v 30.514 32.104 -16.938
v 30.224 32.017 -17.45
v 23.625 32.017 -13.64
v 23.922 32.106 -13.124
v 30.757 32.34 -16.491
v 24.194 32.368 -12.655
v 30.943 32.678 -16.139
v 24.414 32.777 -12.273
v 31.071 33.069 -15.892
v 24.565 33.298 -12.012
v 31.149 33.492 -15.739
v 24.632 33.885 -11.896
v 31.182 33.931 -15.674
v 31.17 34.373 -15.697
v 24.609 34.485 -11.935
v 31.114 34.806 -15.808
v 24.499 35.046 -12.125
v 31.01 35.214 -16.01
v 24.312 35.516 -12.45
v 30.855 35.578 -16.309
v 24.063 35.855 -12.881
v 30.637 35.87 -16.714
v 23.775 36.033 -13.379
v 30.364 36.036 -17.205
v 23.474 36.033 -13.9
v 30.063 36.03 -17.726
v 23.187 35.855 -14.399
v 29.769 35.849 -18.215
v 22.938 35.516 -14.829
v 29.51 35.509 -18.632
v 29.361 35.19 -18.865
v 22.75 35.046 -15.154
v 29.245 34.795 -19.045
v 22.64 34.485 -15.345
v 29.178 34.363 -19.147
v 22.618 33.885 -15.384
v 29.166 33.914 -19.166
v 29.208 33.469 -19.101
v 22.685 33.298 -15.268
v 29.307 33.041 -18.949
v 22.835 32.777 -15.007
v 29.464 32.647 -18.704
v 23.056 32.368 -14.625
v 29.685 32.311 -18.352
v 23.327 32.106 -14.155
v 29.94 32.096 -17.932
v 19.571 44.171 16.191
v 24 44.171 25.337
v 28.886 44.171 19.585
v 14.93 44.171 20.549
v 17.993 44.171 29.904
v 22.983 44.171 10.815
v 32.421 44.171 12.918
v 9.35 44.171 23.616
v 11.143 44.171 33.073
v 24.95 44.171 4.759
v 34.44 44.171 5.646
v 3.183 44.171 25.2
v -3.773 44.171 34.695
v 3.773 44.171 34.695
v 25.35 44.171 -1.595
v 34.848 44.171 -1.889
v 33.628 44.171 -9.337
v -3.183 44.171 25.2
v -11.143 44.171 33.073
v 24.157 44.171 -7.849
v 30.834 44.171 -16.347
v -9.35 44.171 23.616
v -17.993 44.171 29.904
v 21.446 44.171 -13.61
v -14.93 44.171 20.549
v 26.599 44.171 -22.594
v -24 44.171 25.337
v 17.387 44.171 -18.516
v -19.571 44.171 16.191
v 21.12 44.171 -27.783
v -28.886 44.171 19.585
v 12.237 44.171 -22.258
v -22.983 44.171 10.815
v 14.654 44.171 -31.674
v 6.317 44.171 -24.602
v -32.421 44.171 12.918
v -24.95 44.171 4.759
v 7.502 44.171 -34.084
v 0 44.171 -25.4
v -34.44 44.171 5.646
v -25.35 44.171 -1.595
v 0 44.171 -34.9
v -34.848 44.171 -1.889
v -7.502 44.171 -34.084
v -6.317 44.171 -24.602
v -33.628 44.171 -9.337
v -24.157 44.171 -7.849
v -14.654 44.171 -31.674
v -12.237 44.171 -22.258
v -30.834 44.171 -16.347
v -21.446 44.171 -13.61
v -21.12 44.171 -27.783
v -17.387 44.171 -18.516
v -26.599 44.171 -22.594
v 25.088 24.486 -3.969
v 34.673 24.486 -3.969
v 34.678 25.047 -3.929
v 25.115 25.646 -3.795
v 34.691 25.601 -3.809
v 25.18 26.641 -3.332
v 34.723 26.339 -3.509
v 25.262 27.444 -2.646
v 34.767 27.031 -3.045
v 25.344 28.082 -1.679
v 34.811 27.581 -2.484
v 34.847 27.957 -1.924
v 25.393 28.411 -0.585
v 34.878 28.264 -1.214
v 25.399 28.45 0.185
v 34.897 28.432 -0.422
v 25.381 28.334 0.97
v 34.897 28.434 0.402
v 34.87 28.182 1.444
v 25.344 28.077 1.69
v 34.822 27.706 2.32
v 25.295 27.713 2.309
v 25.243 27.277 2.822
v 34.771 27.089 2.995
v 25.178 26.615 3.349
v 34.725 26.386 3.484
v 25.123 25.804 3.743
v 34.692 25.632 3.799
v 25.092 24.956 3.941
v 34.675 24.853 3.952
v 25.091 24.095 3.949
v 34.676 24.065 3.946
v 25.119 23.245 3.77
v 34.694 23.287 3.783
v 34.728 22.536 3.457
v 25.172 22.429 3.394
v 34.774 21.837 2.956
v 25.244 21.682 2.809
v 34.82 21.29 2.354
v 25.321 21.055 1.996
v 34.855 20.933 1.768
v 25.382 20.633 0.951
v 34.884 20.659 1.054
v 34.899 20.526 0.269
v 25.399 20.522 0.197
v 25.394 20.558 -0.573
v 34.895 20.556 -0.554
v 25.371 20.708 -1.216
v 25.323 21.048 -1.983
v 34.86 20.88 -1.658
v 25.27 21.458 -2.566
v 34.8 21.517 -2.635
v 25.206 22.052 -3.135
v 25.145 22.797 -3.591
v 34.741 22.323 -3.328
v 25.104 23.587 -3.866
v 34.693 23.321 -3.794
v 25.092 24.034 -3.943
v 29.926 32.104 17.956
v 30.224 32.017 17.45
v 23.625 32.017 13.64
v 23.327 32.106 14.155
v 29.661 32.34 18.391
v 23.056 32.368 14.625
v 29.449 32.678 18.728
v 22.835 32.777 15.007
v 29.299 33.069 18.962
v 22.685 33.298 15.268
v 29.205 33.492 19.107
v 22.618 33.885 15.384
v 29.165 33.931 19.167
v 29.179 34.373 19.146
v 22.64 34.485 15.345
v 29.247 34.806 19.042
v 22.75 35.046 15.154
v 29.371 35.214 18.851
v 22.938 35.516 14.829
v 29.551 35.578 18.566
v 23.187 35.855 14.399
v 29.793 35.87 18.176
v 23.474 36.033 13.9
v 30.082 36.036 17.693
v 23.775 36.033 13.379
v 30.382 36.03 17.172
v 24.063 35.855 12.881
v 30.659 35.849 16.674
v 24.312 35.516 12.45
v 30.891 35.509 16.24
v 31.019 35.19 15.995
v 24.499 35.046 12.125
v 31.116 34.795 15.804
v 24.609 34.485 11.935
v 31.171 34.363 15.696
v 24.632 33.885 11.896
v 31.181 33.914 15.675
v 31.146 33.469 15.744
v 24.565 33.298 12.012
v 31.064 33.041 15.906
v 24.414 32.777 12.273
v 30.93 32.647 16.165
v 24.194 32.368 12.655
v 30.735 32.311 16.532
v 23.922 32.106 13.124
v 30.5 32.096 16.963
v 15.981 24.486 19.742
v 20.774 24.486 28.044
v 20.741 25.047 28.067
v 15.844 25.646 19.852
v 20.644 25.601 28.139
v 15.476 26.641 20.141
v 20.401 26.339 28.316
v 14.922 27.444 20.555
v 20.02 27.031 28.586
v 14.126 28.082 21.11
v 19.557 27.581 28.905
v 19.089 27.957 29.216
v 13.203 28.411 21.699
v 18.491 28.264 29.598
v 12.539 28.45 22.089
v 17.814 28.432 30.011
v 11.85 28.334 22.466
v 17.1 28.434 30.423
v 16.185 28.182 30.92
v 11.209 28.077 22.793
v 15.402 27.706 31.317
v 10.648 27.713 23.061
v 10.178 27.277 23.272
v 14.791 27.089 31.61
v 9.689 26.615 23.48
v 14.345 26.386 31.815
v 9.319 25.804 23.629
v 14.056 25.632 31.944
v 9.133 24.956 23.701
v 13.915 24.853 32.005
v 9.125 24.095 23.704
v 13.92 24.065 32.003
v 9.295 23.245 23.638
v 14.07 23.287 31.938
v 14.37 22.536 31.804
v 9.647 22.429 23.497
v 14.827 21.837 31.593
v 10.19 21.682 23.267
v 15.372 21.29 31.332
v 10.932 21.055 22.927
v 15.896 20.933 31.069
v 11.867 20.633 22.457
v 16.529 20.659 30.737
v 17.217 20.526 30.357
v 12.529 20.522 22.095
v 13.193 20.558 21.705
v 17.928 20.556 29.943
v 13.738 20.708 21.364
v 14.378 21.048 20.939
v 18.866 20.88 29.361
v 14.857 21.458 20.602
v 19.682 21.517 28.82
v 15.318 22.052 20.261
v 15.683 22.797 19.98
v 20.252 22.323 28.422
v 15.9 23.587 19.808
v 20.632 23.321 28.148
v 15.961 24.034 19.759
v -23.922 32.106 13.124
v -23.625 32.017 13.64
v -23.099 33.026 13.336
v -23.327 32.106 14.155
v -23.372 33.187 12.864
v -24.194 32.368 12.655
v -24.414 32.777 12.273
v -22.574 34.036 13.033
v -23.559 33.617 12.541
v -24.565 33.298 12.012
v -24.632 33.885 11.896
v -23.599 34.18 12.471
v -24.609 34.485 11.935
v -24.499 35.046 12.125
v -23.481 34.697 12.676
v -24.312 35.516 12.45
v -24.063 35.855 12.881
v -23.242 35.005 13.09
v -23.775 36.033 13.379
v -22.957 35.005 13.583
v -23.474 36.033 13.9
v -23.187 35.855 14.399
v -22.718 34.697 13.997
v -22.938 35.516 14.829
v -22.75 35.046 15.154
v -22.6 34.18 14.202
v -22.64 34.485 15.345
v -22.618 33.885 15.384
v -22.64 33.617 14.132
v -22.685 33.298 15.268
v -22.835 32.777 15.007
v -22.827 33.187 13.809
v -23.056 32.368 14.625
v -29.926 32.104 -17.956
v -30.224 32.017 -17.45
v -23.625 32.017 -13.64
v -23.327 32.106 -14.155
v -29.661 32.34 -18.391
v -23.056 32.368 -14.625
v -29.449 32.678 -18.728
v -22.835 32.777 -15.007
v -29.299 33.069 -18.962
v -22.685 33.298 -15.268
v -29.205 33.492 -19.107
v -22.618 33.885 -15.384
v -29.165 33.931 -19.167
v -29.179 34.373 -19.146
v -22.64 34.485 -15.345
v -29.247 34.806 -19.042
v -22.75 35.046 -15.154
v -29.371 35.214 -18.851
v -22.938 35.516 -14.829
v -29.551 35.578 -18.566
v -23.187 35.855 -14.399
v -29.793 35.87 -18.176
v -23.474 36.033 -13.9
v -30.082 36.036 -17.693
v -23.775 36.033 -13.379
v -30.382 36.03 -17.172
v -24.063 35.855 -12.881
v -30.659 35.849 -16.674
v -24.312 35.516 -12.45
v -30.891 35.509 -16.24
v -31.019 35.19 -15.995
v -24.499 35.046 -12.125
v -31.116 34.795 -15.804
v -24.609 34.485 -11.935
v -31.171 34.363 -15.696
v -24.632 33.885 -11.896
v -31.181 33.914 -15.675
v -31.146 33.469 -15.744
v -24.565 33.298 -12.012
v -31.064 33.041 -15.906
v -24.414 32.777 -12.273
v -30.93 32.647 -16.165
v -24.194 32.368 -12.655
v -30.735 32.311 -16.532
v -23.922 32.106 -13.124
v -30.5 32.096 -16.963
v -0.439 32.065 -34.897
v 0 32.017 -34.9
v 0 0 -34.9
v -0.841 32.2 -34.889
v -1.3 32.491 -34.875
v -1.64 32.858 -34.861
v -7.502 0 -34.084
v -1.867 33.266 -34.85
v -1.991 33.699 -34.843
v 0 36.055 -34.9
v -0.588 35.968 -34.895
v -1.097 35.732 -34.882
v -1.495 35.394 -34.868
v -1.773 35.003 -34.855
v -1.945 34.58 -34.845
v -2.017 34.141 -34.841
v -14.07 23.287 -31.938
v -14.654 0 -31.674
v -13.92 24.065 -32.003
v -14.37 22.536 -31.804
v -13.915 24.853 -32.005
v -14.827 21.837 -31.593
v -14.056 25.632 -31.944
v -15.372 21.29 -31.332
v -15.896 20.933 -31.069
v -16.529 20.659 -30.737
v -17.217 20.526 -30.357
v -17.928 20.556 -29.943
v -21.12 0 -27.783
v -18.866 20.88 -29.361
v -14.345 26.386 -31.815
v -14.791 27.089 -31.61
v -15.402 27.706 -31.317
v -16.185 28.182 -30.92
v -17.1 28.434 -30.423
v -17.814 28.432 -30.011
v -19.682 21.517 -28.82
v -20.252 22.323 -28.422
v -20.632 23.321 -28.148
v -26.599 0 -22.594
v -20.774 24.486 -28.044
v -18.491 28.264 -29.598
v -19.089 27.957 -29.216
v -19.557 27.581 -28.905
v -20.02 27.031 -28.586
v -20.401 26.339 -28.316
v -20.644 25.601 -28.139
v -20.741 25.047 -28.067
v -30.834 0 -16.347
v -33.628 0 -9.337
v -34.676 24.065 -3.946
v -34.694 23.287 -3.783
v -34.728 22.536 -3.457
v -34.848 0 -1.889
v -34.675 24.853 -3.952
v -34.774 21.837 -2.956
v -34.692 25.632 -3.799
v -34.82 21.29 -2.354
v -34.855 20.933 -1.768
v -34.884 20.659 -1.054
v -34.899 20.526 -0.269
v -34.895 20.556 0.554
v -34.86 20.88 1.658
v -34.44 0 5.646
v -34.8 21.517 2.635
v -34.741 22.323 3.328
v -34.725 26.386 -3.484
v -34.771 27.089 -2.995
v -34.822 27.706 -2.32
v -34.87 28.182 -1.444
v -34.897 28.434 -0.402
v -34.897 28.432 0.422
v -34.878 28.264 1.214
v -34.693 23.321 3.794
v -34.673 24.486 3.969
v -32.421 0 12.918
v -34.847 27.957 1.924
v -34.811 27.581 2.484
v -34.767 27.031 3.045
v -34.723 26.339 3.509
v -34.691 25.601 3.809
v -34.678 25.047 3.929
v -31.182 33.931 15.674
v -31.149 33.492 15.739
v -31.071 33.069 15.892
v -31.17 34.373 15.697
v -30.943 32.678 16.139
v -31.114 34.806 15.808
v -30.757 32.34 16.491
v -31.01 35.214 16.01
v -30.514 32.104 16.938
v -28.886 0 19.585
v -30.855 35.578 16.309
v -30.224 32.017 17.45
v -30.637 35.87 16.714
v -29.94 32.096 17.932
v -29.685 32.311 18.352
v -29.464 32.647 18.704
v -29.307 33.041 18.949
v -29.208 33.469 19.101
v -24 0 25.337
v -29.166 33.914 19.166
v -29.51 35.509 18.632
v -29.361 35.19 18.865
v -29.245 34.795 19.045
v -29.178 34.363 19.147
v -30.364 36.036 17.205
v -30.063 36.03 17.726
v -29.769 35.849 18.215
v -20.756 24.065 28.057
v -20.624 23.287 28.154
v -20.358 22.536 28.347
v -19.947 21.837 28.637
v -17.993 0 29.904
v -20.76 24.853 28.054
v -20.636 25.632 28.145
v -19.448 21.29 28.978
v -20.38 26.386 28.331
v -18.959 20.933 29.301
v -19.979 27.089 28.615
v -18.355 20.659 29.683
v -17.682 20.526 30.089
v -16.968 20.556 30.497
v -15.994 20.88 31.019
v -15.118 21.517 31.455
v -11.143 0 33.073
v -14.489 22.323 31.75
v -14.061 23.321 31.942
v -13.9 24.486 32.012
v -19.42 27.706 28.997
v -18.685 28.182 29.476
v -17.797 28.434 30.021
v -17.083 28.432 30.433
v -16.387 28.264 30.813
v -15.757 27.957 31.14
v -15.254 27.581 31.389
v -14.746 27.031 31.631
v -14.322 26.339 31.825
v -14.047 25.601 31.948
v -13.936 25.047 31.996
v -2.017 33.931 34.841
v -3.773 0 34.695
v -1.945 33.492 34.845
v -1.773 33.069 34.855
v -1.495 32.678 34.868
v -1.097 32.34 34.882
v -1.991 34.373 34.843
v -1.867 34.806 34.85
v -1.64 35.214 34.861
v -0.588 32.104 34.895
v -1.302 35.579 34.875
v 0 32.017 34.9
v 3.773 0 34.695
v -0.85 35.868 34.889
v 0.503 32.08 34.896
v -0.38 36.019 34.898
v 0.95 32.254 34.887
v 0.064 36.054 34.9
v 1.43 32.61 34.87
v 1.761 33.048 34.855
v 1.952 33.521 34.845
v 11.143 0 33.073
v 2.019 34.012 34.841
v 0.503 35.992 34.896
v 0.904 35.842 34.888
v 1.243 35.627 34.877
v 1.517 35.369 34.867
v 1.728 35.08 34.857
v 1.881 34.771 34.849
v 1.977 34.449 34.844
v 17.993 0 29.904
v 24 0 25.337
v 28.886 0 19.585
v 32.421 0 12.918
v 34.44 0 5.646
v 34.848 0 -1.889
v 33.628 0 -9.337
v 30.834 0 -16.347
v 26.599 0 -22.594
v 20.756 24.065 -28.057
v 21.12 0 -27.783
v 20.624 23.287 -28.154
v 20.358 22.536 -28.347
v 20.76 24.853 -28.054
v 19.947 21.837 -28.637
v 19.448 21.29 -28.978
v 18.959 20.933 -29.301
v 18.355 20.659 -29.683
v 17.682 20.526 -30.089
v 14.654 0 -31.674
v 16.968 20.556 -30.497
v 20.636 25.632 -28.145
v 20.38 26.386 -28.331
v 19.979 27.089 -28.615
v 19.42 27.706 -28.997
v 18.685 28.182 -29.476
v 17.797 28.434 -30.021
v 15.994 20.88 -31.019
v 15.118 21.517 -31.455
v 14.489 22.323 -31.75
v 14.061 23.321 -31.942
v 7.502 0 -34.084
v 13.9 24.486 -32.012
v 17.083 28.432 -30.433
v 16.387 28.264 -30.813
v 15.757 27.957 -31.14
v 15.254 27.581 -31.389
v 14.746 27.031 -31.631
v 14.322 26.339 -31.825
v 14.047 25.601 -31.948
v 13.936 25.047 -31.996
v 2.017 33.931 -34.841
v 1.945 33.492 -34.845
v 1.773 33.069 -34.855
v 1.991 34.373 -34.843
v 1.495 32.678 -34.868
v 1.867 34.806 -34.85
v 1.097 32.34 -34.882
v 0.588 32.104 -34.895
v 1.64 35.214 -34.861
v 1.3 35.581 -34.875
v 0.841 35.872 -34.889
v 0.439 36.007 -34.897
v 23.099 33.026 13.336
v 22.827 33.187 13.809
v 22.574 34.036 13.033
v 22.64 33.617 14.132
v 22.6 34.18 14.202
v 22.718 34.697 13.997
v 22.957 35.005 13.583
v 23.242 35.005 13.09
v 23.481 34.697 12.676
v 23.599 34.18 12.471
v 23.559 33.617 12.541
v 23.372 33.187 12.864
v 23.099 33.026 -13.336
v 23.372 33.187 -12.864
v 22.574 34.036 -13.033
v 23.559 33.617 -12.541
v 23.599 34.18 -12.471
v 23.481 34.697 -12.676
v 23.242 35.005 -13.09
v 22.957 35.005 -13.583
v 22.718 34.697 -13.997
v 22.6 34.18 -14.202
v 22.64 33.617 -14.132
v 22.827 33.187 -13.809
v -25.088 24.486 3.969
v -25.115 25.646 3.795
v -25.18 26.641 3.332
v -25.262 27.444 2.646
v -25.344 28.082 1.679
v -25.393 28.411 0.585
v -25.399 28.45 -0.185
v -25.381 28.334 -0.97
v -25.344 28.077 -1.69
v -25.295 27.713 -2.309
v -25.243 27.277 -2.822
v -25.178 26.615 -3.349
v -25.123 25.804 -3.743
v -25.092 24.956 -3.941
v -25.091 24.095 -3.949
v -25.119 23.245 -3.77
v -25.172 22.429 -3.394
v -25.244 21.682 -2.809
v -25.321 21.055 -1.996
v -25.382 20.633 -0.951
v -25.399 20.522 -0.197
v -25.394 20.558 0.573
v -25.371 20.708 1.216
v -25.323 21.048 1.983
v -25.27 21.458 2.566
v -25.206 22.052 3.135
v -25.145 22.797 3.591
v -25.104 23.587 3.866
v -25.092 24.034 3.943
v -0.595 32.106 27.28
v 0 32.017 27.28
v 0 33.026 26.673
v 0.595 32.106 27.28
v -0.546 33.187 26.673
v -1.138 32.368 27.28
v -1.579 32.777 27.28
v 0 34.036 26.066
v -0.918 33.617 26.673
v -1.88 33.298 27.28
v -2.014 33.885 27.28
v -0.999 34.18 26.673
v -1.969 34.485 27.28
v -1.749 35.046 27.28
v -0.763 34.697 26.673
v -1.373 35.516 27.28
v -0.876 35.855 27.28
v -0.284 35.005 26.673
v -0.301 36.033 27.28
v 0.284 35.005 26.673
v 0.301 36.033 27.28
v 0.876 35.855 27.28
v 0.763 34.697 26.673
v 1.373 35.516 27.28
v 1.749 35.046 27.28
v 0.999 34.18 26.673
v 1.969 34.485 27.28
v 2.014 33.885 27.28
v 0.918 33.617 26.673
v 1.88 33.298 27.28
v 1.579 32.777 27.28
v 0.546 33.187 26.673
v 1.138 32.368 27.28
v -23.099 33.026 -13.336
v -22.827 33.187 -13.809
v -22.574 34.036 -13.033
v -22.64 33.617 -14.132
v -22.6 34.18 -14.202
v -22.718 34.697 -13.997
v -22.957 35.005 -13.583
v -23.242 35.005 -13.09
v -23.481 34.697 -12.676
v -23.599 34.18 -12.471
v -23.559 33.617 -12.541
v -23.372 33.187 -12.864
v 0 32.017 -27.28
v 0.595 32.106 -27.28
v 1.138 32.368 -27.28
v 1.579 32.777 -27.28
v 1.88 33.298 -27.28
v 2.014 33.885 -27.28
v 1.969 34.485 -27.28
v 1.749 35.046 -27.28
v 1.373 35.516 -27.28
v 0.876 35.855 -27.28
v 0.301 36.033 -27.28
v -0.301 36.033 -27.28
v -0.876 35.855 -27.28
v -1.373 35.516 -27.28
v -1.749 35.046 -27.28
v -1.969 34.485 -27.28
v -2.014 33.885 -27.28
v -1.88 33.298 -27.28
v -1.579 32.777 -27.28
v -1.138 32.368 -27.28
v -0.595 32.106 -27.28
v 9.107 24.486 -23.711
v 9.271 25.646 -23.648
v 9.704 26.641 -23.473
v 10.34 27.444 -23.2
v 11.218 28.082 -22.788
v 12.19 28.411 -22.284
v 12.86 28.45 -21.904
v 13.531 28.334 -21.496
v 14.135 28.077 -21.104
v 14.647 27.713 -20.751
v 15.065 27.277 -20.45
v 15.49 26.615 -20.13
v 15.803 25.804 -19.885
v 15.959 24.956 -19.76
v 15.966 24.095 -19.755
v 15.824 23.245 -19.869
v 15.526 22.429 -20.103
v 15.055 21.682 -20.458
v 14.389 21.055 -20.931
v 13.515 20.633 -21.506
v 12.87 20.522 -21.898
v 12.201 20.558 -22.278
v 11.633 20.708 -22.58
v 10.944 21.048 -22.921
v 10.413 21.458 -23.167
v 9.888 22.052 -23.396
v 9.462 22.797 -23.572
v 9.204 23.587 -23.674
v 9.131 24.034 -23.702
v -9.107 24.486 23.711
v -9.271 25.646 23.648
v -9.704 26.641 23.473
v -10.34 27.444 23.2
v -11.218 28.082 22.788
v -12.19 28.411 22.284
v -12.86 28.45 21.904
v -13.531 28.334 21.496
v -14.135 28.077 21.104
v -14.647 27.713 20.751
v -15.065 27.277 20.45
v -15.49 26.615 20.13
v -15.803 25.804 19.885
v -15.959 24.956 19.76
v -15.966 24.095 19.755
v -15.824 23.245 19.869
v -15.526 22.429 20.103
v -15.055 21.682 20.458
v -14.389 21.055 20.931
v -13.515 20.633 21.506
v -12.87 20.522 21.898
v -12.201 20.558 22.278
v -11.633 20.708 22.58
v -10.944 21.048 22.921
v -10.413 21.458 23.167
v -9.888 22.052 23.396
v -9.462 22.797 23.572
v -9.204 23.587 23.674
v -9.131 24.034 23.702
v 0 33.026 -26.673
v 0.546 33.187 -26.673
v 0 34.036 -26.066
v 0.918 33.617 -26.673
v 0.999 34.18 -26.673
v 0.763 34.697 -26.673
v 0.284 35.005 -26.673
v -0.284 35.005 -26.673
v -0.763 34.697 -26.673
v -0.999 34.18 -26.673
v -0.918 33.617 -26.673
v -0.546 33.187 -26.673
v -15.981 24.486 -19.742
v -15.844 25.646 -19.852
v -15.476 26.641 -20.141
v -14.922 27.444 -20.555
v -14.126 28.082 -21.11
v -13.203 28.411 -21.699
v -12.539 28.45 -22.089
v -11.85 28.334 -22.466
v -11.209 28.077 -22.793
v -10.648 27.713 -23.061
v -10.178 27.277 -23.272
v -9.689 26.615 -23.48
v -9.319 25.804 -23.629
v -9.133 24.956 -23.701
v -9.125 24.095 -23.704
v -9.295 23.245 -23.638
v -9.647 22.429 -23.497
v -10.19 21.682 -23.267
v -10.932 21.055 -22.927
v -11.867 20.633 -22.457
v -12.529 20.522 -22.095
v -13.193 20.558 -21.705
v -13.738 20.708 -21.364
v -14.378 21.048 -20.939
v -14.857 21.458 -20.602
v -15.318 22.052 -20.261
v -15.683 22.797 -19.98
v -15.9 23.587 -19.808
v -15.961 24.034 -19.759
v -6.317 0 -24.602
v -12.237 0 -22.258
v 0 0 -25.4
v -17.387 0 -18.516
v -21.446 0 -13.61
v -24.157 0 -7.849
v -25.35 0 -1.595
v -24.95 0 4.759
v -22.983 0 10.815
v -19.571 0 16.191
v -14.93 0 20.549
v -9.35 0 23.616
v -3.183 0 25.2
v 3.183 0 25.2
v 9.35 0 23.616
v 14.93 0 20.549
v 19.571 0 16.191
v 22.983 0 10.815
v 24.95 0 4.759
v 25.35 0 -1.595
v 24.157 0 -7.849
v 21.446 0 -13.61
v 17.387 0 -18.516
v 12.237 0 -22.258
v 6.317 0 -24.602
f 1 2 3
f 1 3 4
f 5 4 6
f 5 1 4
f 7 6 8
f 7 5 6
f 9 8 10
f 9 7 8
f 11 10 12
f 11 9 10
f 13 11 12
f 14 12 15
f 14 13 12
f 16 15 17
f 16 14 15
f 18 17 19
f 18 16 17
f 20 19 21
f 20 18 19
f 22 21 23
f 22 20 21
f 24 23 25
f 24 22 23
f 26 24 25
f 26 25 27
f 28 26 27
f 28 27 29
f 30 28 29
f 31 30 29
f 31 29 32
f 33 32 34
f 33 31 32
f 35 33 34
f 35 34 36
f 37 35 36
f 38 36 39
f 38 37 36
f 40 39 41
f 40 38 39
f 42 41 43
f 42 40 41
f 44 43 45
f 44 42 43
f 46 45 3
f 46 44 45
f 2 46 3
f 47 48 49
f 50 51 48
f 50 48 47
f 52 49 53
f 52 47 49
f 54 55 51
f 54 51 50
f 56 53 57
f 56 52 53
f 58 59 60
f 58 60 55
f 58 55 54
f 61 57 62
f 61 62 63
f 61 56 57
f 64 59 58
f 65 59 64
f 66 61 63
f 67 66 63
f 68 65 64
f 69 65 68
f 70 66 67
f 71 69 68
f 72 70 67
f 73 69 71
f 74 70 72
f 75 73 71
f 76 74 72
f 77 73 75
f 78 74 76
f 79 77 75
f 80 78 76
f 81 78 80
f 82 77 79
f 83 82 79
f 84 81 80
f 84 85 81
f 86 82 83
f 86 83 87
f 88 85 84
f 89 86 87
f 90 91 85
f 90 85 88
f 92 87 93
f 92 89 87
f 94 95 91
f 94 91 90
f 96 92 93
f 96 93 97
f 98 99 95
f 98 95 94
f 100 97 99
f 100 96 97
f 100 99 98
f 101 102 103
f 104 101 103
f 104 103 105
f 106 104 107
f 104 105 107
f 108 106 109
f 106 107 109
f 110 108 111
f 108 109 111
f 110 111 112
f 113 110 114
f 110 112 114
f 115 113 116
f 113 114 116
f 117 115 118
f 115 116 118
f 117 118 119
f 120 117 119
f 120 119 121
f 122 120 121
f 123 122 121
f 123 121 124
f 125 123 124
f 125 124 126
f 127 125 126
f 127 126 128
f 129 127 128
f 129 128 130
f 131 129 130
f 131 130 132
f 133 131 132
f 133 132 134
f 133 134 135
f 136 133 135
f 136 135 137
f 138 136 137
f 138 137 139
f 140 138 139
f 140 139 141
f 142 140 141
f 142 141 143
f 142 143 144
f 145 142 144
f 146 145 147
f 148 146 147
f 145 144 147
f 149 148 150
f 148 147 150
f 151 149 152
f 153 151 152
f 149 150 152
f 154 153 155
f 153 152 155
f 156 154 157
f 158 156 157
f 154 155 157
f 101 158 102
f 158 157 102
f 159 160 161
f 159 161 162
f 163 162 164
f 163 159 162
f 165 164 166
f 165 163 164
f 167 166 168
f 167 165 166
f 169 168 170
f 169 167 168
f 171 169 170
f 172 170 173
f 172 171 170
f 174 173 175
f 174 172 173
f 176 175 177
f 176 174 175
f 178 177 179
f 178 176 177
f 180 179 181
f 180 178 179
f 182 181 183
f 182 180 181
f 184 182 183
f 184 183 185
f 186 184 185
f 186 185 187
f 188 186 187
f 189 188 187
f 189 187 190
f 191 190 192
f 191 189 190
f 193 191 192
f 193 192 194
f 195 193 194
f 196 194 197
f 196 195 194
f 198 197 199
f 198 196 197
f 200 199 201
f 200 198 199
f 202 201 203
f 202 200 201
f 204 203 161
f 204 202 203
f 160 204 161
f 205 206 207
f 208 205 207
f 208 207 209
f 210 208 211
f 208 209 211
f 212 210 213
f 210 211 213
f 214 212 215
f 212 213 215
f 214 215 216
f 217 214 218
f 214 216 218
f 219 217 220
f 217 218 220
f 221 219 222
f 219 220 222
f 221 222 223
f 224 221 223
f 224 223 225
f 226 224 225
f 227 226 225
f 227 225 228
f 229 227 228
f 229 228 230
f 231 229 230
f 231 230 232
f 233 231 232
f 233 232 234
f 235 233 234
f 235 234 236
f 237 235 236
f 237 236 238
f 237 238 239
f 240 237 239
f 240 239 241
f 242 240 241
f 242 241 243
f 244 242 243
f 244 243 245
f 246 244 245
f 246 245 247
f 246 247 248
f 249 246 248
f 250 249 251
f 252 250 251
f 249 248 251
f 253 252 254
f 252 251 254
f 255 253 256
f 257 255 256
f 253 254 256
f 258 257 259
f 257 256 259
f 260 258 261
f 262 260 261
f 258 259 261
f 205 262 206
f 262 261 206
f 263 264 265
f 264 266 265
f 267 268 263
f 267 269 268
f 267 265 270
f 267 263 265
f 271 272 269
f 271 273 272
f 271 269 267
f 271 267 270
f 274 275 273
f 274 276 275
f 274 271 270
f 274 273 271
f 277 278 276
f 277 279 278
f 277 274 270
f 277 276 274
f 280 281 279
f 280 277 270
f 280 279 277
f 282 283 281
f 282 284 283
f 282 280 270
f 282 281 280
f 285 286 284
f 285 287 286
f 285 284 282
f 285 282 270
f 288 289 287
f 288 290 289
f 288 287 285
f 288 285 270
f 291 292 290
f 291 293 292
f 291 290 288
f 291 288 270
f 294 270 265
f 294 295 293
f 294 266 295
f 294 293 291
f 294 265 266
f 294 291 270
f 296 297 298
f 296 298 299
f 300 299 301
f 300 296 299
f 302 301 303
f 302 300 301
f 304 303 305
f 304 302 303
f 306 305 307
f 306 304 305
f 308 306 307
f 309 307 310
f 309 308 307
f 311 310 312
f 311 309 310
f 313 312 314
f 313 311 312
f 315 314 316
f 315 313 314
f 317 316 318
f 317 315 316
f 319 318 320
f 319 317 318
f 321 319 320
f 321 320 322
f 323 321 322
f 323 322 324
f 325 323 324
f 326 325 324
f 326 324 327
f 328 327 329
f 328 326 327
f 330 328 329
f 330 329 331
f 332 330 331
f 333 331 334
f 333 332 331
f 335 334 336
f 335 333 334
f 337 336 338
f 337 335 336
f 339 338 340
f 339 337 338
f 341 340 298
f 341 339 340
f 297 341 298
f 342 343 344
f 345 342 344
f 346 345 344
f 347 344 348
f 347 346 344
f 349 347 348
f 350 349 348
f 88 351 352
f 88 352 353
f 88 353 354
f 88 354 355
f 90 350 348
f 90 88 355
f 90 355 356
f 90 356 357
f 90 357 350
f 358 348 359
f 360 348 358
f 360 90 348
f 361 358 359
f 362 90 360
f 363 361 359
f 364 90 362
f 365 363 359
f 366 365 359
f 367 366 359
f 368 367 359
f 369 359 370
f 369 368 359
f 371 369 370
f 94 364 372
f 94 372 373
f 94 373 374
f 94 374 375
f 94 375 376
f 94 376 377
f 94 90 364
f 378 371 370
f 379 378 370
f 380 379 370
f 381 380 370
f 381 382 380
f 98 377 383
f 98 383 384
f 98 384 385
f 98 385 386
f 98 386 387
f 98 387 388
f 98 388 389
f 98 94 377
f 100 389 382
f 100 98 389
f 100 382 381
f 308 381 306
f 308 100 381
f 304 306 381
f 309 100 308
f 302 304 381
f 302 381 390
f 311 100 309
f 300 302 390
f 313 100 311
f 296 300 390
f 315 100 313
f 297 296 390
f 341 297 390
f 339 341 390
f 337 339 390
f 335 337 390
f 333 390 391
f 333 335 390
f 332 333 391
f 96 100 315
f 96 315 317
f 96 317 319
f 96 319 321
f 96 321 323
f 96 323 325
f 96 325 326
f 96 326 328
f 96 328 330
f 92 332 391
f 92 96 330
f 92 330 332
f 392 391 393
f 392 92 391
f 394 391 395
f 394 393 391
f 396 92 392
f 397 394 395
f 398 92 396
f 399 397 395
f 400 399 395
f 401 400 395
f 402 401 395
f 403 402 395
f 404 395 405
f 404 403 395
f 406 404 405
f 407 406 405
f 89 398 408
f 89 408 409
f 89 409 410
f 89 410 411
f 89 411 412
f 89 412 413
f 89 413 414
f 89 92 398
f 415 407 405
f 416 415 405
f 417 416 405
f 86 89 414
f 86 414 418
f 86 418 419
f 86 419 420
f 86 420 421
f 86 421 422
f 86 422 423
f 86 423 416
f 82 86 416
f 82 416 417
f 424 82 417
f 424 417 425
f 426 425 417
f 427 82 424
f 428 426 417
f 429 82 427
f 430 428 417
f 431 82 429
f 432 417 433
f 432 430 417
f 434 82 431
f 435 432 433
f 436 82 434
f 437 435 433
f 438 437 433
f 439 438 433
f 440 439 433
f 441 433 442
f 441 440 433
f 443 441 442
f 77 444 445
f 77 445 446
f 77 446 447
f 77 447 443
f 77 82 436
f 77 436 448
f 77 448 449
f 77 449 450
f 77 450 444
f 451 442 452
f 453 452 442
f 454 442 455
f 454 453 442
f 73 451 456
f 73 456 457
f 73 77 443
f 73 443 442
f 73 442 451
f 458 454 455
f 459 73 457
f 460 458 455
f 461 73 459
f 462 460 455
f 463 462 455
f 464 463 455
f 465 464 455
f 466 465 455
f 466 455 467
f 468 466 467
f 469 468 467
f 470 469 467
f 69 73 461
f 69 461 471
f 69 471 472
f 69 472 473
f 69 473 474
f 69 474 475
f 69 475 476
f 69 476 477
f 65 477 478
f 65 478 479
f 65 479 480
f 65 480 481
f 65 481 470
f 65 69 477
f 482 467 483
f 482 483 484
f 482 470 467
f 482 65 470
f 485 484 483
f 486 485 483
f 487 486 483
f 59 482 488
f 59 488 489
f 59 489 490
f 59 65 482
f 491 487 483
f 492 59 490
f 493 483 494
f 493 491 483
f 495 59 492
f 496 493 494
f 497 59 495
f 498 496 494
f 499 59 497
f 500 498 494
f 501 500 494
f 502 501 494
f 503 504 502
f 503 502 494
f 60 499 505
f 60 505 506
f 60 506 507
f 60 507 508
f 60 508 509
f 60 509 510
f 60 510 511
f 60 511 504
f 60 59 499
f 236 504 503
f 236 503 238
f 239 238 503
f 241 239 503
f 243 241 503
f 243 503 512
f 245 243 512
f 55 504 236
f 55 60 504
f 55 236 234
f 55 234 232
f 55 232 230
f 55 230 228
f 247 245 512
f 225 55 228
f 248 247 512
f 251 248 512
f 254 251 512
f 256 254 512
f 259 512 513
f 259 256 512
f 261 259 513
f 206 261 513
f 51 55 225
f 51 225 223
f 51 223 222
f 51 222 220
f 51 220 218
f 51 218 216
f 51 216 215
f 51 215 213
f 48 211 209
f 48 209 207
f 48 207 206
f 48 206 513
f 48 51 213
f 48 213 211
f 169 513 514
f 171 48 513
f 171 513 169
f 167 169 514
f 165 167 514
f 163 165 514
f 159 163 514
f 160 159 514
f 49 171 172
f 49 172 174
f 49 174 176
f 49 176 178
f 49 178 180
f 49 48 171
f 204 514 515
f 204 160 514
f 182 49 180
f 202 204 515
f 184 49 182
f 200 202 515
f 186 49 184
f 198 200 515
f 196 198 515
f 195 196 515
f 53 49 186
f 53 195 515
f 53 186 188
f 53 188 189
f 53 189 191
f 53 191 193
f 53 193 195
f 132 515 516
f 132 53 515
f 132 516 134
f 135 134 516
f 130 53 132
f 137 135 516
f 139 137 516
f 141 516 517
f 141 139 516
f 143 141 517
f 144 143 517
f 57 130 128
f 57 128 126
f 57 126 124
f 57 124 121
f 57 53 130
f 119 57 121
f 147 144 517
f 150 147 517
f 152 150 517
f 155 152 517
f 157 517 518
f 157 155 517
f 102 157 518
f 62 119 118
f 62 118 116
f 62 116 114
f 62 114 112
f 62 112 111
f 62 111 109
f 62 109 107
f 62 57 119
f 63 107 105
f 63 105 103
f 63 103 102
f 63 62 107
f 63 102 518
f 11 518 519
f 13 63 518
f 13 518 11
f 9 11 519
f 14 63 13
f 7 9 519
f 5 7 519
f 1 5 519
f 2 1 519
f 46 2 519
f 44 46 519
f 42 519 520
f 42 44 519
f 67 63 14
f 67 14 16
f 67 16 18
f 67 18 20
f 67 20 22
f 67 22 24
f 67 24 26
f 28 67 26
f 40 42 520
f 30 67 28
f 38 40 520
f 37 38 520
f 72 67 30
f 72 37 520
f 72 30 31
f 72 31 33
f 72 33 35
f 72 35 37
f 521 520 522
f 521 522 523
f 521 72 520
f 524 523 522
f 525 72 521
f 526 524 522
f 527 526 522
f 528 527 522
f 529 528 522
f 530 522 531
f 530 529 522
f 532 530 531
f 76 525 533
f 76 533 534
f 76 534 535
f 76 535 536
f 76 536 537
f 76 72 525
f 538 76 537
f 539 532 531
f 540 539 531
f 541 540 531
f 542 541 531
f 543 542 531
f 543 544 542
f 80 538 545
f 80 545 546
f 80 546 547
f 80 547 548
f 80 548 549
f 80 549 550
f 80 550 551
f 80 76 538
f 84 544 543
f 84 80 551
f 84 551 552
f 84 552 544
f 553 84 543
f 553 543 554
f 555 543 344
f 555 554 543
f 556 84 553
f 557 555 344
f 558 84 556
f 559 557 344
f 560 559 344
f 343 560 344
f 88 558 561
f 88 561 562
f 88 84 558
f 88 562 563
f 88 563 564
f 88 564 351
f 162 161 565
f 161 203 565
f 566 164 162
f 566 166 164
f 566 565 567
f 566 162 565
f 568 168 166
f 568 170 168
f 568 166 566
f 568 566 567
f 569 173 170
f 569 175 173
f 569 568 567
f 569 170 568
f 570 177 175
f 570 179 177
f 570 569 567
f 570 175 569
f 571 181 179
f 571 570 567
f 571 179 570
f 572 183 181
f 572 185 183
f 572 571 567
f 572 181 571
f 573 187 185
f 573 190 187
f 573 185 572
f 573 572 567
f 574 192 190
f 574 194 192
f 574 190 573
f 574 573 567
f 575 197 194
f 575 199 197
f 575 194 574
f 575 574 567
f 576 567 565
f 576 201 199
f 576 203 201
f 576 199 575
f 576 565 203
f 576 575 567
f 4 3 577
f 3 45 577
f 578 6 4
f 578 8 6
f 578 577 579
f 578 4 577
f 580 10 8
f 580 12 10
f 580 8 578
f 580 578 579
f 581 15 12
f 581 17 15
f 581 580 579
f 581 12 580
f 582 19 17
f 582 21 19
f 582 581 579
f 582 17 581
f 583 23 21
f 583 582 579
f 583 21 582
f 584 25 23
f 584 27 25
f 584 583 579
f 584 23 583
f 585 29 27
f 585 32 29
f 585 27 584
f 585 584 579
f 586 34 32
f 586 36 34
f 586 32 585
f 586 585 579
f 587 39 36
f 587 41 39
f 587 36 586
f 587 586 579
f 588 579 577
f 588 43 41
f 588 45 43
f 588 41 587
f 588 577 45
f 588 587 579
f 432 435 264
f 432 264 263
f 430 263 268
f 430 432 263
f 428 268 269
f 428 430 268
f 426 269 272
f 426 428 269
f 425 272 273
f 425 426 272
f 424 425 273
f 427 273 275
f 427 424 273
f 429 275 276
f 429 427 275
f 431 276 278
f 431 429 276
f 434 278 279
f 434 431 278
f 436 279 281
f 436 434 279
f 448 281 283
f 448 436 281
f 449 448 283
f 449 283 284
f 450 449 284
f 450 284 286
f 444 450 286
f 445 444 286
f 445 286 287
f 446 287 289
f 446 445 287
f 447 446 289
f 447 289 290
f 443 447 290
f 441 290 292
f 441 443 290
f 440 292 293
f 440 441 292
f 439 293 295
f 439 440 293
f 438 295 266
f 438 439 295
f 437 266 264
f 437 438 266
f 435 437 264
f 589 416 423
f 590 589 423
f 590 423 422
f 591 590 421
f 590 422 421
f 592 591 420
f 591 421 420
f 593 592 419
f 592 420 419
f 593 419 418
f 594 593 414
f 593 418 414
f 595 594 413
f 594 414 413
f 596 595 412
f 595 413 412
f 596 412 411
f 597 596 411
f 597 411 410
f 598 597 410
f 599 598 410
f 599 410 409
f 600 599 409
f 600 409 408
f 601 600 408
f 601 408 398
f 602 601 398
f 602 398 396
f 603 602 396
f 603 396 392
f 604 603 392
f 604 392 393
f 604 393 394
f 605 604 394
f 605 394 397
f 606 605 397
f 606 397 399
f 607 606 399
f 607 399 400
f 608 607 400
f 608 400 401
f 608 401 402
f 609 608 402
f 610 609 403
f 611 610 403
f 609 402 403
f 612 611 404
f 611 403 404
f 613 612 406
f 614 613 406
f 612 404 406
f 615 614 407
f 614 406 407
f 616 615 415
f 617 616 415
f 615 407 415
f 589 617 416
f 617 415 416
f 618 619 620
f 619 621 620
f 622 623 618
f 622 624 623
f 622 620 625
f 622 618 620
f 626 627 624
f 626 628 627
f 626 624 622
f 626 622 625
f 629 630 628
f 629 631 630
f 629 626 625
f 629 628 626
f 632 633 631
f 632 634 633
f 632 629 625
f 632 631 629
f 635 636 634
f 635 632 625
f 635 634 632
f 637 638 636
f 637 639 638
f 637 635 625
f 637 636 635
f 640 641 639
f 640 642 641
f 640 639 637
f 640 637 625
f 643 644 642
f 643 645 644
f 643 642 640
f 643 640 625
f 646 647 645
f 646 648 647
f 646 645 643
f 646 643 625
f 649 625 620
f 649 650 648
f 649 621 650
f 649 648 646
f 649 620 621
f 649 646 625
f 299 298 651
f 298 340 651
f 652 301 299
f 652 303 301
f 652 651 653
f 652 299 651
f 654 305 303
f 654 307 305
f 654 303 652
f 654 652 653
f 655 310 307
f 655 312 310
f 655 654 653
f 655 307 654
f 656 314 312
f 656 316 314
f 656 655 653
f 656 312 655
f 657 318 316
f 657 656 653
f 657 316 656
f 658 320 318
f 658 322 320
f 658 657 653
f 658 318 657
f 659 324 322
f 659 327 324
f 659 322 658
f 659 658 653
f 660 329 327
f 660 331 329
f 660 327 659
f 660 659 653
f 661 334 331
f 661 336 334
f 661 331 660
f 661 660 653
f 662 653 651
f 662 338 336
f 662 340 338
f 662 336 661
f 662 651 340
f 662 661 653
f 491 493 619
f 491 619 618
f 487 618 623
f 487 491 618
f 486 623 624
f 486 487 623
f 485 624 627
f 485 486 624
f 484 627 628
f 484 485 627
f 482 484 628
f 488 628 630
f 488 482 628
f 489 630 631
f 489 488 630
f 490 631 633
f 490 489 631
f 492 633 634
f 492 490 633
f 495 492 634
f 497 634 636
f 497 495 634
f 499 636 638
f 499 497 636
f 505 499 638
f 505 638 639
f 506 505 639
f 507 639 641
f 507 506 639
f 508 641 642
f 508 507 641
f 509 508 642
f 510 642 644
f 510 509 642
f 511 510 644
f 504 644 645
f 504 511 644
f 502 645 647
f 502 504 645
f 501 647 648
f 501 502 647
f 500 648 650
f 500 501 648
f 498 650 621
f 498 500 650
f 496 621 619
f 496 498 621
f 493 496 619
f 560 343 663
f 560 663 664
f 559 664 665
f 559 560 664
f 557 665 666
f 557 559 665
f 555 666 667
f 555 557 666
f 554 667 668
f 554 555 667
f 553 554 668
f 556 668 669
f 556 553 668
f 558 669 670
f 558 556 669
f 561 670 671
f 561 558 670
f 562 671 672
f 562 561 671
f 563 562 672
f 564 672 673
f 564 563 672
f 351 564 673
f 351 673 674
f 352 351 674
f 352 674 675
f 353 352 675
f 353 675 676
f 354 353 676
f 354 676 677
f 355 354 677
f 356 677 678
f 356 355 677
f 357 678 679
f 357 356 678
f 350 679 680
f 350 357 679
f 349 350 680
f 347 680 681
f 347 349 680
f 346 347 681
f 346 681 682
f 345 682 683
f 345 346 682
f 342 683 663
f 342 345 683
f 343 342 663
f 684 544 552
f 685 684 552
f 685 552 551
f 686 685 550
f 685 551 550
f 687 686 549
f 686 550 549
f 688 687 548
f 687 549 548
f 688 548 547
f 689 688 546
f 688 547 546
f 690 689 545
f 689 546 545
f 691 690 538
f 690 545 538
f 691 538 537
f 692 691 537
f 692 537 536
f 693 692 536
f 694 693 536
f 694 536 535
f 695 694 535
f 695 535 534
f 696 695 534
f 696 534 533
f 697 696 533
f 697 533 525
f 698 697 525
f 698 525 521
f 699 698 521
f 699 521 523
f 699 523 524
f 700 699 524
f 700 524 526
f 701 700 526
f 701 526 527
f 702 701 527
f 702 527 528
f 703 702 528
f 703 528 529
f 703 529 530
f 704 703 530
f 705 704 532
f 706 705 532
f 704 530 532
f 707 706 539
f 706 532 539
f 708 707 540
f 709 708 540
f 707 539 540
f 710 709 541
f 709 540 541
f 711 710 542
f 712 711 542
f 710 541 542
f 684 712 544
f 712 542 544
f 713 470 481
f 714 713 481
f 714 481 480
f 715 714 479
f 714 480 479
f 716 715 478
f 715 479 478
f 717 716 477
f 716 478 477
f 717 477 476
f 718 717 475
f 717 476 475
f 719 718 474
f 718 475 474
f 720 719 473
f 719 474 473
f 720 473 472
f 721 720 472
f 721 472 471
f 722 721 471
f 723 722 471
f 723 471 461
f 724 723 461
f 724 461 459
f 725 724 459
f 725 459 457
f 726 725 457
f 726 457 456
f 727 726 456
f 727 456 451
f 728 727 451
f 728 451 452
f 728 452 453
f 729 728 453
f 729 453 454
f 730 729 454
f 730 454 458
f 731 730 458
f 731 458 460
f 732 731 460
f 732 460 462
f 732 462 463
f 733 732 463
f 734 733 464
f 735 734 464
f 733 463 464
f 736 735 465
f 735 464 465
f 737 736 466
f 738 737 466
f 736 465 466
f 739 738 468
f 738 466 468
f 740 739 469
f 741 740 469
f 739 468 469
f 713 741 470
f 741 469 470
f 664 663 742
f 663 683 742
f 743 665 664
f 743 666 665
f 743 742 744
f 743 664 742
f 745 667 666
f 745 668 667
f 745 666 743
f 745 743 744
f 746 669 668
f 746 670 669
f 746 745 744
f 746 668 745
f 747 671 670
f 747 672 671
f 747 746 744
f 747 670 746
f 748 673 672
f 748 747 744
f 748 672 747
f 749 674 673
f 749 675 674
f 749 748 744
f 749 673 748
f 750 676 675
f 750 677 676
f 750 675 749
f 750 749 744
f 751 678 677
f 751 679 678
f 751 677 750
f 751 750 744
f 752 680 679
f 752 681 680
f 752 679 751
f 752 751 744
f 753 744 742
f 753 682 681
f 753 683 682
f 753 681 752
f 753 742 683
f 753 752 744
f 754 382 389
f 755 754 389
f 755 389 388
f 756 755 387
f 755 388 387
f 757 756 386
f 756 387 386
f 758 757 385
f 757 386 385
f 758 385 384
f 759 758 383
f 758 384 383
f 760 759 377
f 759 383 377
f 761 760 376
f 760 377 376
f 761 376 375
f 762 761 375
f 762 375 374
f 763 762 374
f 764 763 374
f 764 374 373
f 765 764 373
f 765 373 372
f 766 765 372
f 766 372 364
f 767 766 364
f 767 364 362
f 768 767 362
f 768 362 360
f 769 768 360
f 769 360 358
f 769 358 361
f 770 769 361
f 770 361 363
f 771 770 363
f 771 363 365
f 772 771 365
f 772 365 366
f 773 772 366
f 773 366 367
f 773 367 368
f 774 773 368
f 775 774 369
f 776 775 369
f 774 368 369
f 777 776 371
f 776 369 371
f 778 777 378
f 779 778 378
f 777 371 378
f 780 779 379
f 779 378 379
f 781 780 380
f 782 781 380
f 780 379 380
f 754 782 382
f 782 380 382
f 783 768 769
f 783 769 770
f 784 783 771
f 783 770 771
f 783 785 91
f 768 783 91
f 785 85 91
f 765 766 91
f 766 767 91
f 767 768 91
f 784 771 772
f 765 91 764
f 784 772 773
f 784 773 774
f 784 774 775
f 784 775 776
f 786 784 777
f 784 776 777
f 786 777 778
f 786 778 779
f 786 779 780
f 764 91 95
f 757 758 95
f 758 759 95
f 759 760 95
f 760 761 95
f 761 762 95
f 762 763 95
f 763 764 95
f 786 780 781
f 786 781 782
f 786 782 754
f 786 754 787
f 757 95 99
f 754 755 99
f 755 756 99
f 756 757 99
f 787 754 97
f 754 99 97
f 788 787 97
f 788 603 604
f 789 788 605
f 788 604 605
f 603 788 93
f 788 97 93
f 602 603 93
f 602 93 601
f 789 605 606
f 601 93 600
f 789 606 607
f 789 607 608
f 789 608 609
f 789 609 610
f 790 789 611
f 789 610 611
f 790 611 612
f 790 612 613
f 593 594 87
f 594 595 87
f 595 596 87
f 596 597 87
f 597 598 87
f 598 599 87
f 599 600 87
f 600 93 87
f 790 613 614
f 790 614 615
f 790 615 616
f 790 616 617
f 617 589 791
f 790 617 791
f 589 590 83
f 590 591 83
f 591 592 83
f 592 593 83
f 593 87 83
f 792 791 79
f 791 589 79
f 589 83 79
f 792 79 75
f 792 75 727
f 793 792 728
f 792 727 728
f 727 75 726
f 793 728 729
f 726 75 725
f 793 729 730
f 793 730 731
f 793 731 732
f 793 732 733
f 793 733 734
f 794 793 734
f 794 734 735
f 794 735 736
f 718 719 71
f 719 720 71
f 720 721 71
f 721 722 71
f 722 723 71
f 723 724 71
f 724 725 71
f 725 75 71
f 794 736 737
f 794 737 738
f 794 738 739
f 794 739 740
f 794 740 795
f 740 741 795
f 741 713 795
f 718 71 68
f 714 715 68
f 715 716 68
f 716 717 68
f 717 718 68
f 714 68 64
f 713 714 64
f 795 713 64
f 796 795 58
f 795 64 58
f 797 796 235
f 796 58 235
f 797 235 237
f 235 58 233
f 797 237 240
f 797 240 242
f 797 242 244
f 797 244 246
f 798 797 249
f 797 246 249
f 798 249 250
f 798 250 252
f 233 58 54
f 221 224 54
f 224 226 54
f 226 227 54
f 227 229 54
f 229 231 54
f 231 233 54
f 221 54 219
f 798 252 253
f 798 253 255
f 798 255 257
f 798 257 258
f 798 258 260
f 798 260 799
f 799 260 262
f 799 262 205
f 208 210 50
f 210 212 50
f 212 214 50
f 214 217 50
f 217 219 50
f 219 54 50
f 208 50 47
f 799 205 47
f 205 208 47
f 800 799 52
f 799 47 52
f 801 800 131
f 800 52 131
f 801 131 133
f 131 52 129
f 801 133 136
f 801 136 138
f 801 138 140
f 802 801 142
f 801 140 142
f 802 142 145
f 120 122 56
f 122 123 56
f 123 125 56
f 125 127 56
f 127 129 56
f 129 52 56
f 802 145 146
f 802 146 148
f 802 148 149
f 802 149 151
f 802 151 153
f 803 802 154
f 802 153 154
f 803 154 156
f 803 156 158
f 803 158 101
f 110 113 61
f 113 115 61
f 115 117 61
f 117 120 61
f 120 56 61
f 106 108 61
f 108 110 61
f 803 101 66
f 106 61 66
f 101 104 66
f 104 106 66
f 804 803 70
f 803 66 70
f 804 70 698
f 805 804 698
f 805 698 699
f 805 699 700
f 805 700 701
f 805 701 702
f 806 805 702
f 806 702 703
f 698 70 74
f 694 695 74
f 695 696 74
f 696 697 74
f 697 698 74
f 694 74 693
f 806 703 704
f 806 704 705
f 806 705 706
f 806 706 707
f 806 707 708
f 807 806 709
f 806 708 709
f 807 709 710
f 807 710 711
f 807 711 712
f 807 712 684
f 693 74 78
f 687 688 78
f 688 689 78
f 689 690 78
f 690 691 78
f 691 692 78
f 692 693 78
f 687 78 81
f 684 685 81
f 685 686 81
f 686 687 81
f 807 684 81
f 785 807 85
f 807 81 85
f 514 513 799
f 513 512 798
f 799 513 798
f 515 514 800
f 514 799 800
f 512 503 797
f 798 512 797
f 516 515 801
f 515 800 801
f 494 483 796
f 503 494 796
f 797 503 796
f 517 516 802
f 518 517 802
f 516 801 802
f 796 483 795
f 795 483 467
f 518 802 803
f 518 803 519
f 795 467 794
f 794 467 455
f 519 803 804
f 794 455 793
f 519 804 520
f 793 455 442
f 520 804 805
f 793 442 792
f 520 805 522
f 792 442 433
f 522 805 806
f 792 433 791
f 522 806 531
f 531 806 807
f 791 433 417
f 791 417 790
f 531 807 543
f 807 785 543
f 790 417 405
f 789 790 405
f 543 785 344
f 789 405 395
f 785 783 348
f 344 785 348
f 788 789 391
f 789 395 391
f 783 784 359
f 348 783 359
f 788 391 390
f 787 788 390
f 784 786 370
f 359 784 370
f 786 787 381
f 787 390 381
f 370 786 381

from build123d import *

# Parameters (mm, degrees)
SKETCH2_W                    = 9.4996
SKETCH2_H                    = 44.1706
F_3_8_16_TAPPED_HOLE2_REACH  = 91.671
F_3_8_16_TAPPED_HOLE2_BORE_R = 3.96875
CIRPATTERN1_COUNT            = 6
CIRPATTERN2_COUNT            = 6


with BuildPart() as part:
    # Sketch2 → Revolve1 (revolve)
    with BuildSketch(Plane.XY, mode=Mode.PRIVATE) as revolve1_sk:
        with Locations((-30.1498, 22.0853)):
            Rectangle(SKETCH2_W, SKETCH2_H)
    revolve(revolve1_sk.sketch.rotate(Axis((0, 0, 0), (0, 1, 0)), 270), axis=Axis((0, 0, 0), (0, 1, 0)))

    # 3_8-16 Tapped Hole2 bore → 3_8-16 Tapped Hole2 (cut, up to next)
    with BuildSketch(Plane(origin=(34.8996, 0, 0), x_dir=(0, 0, -1), z_dir=(1, 0, 0)), mode=Mode.PRIVATE) as f_3_8_16_tapped_hole2_sk1:
        with Locations((0, 24.4856)):
            Circle(F_3_8_16_TAPPED_HOLE2_BORE_R)
    f_3_8_16_tapped_hole2_tool1 = extrude(f_3_8_16_tapped_hole2_sk1.sketch, amount=-F_3_8_16_TAPPED_HOLE2_REACH, mode=Mode.PRIVATE) & part.part
    f_3_8_16_tapped_hole2 = f_3_8_16_tapped_hole2_tool1.solids().sort_by_distance((34.8996, 24.4856, 0))[0]
    add(f_3_8_16_tapped_hole2, mode=Mode.SUBTRACT)

    # CirPattern1: 3_8-16 Tapped Hole2 ×6 about axis
    cirpattern1_axis = Axis((0, 44.1706, 0), (0, -1, 0))
    for i in range(1, CIRPATTERN1_COUNT):
        add(f_3_8_16_tapped_hole2.rotate(cirpattern1_axis, i * 360 / CIRPATTERN1_COUNT), mode=Mode.SUBTRACT)

    # Sketch14 → Tap Drill for _10-32 Tap1 (revolve, cut)
    with BuildSketch(Plane(origin=(0, 34.036, 34.8996), x_dir=(0, -1, 0), z_dir=(1, 0, 0))):
        Polygon((0, 0), (0, 8.833317848), (2.0193, 7.62), (2.0193, 0), align=None)
    tap_drill_for_10_32_tap1 = revolve(axis=Axis((0, 34.036, 41.2496), (0, 0, -1)), mode=Mode.SUBTRACT)

    # CirPattern2: Tap Drill for _10-32 Tap1 ×6 about axis
    cirpattern2_axis = Axis((0, 0, 0), (0, -1, 0))
    for i in range(1, CIRPATTERN2_COUNT):
        add(tap_drill_for_10_32_tap1.rotate(cirpattern2_axis, i * 360 / CIRPATTERN2_COUNT), mode=Mode.SUBTRACT)


solid = part.part
